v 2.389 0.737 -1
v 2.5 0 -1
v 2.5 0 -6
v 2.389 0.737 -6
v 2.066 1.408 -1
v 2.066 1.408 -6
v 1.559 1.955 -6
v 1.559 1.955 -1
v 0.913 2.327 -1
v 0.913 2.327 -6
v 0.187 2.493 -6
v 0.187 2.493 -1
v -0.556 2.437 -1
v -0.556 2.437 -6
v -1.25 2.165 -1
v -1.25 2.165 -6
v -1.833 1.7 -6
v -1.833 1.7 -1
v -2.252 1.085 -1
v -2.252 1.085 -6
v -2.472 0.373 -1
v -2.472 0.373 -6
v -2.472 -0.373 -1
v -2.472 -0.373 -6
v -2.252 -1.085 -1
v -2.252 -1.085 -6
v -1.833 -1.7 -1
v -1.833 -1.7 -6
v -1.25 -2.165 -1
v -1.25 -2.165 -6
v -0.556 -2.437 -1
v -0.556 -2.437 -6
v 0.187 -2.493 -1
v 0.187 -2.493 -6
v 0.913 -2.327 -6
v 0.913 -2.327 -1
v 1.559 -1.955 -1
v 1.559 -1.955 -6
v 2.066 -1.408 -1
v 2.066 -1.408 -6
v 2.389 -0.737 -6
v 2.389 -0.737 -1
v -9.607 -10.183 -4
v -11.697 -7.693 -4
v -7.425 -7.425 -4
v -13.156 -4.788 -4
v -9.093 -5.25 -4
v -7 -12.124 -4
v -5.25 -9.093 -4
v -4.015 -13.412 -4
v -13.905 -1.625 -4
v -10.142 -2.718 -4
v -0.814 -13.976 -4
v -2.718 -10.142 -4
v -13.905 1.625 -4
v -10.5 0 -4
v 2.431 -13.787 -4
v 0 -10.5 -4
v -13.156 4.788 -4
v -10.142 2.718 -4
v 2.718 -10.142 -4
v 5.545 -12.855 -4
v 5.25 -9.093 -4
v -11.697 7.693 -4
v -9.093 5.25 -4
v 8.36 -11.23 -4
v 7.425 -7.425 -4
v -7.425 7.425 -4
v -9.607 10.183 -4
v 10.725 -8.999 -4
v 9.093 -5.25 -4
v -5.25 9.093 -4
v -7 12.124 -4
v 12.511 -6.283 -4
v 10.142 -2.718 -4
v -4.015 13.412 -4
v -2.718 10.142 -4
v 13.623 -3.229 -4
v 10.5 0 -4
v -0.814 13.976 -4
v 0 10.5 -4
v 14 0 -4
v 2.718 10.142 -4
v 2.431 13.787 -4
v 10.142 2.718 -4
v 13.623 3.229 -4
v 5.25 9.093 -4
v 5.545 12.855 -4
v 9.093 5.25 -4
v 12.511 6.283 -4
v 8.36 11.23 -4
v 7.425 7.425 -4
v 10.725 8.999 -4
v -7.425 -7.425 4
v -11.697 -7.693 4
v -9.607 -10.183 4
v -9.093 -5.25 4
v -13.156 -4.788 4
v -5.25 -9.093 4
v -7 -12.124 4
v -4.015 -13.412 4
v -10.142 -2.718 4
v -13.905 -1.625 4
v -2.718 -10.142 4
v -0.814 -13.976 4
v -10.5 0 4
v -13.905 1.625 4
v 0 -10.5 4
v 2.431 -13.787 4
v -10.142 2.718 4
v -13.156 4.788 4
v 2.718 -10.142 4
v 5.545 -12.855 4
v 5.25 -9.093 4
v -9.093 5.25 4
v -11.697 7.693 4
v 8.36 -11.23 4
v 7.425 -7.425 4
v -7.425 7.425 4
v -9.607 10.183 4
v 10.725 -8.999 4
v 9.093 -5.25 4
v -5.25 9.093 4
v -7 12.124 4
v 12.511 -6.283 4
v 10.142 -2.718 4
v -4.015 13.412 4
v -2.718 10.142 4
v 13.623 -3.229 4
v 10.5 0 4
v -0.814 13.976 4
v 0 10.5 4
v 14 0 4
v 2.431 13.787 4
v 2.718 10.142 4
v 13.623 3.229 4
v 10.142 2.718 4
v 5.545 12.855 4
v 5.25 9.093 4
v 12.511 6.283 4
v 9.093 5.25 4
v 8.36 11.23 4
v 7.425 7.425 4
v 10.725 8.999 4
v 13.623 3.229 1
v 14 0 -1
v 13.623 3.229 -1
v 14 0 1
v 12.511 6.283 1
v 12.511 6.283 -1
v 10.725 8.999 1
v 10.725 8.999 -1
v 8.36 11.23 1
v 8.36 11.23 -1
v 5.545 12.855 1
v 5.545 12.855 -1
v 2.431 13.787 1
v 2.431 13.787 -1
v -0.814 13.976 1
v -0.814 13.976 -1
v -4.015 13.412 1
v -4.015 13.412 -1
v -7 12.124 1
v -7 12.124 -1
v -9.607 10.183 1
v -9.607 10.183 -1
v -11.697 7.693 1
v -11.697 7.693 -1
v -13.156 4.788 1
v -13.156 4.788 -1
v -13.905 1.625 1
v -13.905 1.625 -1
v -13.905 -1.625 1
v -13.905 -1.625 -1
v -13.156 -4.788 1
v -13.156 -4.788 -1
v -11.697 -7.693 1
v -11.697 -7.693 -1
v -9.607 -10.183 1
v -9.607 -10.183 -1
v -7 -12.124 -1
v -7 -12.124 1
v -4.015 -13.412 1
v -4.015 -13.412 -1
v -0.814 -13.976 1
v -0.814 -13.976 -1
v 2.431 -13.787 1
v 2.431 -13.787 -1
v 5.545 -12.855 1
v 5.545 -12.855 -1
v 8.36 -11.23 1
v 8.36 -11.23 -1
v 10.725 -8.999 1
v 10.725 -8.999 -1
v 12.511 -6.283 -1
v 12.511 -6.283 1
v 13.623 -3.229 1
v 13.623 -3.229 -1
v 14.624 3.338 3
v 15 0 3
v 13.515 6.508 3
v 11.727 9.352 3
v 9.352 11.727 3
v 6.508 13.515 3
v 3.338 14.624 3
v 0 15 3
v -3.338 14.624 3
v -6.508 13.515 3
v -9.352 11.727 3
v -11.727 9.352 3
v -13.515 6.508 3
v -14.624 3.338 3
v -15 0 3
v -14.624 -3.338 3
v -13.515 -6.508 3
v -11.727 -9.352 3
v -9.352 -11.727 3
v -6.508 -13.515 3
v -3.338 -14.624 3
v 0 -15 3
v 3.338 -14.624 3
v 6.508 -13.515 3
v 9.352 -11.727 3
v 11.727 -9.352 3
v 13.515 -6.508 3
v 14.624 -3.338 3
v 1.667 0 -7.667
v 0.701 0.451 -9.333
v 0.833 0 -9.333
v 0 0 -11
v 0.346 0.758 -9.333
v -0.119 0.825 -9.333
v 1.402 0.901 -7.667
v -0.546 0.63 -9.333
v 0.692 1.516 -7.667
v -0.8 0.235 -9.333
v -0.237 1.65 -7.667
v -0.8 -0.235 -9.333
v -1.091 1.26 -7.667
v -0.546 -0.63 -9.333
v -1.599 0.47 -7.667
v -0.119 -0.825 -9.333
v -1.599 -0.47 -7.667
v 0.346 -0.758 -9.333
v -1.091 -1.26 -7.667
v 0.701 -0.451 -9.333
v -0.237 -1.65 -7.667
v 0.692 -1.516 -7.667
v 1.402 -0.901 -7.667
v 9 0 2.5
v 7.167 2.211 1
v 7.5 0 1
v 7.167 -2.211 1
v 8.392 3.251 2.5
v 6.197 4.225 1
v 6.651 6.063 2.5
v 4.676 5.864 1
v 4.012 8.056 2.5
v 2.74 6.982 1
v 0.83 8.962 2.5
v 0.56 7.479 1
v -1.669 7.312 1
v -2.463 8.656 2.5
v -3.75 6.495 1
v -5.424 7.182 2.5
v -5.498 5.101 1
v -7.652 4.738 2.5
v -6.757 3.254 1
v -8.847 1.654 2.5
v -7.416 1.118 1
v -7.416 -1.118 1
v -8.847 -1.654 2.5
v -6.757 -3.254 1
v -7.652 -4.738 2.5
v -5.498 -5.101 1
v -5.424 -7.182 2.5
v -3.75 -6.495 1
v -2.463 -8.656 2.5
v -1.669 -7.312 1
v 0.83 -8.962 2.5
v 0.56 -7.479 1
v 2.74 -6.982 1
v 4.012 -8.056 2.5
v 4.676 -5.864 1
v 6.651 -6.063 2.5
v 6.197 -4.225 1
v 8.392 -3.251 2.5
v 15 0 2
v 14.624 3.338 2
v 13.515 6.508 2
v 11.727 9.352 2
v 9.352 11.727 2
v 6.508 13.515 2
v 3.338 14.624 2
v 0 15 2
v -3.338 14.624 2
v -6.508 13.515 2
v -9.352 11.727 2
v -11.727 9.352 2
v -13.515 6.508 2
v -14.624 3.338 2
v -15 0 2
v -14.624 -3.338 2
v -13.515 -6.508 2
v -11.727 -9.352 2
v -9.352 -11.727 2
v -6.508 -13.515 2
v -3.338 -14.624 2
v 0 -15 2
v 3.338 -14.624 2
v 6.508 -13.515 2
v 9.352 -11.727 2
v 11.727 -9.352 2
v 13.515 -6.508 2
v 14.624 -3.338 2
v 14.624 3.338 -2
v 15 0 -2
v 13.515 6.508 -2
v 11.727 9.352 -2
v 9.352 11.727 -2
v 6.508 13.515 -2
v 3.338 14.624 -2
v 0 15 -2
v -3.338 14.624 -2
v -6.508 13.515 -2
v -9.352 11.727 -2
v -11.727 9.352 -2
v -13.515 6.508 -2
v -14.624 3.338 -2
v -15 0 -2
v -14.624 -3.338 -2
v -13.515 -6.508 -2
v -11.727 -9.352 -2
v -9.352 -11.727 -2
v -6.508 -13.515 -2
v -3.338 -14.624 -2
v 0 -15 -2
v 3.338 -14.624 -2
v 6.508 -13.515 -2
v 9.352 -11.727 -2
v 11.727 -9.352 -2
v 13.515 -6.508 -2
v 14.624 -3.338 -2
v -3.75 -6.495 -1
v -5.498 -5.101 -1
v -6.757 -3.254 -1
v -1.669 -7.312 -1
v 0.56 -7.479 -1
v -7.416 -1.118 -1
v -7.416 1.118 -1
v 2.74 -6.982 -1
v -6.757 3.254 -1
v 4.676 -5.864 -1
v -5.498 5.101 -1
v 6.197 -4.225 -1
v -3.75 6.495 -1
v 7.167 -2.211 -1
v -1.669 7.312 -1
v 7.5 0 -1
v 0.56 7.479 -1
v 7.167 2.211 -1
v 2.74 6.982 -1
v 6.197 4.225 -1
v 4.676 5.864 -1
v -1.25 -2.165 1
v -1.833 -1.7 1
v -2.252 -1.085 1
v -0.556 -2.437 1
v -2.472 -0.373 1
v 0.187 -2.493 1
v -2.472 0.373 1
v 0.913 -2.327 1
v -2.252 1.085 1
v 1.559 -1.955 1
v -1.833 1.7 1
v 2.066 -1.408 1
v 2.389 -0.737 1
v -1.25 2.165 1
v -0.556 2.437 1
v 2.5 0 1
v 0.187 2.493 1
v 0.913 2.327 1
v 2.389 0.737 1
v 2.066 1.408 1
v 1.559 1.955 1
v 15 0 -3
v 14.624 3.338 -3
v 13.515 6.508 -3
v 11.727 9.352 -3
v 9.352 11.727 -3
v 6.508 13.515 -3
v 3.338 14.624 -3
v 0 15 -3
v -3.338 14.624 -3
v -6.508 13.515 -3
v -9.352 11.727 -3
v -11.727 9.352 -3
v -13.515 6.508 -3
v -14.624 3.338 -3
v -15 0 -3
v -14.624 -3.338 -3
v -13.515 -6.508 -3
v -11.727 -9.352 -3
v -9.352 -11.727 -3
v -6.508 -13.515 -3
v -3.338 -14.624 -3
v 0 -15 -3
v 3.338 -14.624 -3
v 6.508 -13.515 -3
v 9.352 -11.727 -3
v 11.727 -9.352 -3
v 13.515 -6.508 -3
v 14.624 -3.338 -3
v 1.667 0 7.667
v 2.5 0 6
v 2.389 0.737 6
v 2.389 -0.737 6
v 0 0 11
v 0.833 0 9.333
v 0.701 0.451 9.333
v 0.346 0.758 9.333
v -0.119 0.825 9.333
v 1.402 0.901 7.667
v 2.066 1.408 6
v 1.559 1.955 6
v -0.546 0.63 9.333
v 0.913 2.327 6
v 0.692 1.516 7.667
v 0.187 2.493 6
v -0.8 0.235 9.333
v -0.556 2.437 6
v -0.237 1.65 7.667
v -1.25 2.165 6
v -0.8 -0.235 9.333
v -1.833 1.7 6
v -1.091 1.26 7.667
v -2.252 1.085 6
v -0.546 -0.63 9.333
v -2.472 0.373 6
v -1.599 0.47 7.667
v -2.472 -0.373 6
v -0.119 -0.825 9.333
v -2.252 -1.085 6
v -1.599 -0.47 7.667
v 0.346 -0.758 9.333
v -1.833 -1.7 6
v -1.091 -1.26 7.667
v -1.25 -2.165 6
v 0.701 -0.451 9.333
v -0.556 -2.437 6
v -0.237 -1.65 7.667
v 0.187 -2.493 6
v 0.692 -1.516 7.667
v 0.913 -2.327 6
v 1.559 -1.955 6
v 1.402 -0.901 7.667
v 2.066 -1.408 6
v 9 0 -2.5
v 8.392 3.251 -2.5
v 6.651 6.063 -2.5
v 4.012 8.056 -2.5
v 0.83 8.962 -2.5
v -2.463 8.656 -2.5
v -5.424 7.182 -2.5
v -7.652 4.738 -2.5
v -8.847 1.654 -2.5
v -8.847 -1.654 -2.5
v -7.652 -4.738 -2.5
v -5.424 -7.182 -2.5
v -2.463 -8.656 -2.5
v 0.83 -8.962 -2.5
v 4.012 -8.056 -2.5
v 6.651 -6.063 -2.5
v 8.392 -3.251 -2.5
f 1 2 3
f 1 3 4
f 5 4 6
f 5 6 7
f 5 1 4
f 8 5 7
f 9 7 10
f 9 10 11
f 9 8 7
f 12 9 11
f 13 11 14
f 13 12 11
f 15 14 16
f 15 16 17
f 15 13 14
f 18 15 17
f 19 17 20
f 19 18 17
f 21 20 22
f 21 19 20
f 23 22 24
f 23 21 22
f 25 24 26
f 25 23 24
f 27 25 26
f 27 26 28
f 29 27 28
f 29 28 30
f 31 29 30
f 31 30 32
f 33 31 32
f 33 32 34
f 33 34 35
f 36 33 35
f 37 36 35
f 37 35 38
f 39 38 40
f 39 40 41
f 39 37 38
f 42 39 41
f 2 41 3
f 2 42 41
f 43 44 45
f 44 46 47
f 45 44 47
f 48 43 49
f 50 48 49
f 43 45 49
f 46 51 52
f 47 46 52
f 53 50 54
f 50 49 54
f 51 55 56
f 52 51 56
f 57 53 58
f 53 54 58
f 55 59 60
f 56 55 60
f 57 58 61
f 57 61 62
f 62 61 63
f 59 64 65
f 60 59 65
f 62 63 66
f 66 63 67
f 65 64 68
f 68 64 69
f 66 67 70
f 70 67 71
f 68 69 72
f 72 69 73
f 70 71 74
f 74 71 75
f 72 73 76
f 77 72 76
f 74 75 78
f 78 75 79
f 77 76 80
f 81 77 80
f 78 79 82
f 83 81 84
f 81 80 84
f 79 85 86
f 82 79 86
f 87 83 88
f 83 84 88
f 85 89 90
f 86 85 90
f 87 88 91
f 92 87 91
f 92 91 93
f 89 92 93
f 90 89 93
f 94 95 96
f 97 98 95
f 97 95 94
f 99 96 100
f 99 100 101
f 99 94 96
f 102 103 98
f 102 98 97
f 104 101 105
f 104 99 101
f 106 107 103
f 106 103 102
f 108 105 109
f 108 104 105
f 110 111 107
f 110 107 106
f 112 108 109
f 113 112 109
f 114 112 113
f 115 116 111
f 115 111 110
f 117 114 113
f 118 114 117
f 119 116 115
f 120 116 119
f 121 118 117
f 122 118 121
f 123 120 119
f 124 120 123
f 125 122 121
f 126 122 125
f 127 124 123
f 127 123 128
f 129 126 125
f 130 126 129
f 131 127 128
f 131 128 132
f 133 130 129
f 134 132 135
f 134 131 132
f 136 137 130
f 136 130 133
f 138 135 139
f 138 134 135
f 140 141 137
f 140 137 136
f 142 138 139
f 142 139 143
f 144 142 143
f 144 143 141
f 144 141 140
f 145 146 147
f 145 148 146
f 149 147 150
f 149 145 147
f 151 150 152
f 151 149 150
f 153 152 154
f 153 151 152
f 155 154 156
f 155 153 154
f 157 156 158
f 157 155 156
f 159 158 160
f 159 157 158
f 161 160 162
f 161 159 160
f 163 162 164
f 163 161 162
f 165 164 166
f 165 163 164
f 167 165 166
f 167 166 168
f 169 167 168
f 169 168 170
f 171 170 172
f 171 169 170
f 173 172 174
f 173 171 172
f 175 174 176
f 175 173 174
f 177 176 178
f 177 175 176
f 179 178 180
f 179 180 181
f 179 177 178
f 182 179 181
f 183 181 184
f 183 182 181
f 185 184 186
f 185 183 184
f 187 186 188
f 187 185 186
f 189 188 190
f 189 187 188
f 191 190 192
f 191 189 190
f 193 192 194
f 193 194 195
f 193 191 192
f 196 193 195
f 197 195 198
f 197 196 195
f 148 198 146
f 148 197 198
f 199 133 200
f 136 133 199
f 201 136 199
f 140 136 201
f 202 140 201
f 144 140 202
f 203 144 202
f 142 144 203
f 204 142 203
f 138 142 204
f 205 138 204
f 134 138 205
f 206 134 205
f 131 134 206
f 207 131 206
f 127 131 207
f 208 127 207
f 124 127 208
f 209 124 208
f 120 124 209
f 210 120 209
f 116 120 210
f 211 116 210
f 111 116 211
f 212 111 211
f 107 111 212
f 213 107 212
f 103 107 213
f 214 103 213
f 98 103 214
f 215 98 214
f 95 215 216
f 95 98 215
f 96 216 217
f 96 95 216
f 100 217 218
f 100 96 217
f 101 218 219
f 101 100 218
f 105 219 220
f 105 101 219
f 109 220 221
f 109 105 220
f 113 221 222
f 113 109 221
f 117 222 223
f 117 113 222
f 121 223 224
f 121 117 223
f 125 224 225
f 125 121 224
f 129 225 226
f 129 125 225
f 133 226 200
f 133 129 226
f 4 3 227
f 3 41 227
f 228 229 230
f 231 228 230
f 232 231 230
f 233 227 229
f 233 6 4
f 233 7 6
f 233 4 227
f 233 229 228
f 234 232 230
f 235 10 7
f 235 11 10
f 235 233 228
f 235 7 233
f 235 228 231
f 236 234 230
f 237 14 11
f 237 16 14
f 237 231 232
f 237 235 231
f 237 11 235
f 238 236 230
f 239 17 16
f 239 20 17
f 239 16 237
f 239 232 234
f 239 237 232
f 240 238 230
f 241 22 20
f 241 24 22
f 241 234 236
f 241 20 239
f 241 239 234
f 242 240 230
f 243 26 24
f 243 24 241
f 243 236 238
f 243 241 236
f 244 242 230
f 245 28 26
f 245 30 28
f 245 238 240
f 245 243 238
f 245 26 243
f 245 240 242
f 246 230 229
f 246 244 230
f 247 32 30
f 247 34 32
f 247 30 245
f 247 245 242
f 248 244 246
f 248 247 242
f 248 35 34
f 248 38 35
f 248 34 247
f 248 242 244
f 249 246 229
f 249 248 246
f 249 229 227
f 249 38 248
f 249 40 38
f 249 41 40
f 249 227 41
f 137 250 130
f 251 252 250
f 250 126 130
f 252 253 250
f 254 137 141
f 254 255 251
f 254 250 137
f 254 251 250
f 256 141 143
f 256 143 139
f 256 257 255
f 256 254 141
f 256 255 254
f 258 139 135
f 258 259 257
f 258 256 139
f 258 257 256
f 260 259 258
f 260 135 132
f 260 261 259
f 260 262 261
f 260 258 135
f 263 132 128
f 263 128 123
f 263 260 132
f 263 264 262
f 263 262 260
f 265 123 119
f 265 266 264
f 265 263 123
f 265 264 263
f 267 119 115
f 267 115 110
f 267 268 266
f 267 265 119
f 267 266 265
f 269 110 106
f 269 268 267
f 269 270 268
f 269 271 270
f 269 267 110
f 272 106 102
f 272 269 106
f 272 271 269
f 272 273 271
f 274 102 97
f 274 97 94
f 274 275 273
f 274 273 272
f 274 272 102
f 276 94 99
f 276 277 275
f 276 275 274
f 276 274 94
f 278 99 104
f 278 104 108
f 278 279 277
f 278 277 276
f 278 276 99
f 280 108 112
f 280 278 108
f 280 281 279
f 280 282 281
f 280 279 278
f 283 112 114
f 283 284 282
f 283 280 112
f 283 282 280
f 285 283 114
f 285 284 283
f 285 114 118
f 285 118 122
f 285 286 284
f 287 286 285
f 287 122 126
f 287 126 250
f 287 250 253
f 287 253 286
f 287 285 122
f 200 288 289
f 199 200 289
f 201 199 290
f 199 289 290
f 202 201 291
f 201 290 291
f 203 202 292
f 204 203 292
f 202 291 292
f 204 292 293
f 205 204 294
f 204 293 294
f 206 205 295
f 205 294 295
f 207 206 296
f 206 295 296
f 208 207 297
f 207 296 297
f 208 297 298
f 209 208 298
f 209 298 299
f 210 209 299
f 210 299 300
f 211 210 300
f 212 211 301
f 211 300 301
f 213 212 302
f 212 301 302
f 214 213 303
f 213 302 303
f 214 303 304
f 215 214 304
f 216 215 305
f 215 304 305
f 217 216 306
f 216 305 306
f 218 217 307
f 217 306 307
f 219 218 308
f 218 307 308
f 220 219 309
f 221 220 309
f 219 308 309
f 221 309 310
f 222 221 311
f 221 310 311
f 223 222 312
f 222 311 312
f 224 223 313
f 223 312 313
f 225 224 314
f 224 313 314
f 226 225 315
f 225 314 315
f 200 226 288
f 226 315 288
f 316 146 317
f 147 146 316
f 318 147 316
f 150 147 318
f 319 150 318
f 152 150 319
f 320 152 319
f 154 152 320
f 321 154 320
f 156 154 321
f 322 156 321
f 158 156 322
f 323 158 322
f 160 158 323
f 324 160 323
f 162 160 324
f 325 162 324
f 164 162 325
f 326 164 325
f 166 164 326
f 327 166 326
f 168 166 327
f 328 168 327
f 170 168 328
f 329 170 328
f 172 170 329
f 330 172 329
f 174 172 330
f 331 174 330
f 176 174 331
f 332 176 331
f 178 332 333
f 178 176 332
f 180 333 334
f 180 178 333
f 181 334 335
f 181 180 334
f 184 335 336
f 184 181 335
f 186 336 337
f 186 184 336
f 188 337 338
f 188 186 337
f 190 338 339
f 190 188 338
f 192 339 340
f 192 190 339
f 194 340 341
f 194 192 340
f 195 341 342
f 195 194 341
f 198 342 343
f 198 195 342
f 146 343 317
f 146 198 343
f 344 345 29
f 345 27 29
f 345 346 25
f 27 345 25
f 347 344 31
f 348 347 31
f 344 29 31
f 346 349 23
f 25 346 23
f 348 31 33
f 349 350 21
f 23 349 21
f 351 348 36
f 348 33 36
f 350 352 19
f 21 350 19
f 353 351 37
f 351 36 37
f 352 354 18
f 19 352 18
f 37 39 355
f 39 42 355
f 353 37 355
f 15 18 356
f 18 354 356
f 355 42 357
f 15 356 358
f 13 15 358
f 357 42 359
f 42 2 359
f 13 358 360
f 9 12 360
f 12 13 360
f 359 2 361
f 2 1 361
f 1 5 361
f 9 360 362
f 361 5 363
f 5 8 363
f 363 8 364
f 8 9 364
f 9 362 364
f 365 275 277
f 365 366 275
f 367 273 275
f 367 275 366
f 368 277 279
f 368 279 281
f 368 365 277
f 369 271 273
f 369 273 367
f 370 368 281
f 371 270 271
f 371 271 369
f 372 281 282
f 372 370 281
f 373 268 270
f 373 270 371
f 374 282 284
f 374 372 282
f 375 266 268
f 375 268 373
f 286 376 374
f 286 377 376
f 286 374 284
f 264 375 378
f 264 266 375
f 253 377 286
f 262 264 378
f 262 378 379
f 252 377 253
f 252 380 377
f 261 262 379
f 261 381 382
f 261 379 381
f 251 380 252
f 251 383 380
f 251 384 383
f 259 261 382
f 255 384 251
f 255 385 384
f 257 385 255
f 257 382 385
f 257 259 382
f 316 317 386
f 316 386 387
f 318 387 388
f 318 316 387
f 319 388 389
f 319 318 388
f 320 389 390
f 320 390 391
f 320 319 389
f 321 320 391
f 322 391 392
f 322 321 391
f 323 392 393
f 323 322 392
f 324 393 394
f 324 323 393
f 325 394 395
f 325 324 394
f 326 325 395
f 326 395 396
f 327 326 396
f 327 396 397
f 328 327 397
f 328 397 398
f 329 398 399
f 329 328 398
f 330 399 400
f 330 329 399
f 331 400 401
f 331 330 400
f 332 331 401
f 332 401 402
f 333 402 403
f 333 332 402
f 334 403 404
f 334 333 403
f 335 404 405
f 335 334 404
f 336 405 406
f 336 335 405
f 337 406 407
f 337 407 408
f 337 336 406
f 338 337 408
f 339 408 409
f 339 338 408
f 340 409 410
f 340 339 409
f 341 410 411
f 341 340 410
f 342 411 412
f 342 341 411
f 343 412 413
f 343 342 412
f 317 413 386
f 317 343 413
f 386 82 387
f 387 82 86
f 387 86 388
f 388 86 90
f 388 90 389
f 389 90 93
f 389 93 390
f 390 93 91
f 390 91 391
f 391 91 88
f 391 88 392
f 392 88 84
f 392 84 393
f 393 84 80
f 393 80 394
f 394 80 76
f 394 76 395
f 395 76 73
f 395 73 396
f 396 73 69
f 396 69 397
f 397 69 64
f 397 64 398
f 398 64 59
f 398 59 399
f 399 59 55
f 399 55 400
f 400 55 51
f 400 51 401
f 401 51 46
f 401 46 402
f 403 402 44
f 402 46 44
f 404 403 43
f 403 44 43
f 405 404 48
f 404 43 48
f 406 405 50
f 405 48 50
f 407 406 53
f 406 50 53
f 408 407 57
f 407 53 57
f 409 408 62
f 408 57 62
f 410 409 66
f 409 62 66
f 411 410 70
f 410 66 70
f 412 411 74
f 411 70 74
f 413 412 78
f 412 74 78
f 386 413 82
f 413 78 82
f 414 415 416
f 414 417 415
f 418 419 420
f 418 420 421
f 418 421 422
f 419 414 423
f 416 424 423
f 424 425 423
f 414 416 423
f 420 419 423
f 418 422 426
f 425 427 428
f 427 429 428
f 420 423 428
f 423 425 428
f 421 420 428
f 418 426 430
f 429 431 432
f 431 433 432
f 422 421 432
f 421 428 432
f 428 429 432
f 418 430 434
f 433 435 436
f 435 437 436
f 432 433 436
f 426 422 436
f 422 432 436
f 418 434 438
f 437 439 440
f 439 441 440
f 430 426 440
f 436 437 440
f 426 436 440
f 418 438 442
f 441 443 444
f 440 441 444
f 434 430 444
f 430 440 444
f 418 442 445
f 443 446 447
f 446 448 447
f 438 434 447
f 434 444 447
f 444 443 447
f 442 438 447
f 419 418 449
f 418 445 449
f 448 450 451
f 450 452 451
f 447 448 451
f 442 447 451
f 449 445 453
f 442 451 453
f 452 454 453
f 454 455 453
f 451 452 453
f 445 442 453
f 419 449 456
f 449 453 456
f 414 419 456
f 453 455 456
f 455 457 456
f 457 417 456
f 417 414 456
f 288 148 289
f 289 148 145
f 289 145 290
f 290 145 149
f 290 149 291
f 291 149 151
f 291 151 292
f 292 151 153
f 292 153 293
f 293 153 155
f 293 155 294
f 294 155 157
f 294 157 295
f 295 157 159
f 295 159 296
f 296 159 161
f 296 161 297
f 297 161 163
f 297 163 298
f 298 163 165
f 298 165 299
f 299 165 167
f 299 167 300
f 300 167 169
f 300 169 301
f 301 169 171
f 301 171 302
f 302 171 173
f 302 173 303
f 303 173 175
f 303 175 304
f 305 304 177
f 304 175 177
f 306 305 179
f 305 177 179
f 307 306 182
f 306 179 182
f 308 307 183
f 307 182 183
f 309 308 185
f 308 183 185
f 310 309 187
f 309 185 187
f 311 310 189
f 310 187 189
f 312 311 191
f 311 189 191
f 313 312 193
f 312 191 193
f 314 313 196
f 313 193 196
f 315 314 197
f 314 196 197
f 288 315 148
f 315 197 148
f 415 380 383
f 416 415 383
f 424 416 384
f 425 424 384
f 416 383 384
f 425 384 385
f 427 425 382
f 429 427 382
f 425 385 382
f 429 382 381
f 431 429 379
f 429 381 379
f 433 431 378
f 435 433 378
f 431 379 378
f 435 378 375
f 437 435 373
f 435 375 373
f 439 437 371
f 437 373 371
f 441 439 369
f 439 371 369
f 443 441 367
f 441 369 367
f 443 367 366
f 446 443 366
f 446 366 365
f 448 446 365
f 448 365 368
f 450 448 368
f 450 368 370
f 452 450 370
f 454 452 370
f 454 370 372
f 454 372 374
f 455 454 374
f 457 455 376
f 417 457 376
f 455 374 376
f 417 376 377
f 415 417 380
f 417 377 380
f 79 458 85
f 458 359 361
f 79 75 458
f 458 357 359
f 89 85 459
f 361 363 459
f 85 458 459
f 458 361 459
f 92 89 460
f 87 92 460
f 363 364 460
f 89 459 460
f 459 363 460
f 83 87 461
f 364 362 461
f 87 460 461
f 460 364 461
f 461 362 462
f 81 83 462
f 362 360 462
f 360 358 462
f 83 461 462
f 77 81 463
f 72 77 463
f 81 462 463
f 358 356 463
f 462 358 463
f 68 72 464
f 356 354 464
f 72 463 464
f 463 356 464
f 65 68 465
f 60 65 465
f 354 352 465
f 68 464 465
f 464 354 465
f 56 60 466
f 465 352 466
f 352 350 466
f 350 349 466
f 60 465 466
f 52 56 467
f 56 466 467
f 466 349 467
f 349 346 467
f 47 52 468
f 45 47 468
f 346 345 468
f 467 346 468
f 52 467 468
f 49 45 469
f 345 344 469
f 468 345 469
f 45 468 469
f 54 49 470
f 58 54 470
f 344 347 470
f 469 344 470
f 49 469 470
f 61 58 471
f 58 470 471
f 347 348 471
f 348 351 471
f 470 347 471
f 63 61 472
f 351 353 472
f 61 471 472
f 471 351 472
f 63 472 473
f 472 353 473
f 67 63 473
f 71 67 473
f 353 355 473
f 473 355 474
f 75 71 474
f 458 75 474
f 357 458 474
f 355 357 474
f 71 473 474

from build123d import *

# Parameters (mm, degrees)
F0_R     = 14
F1_DEPTH = 1
F2_R     = 15
F2_R_2   = 14
F2_R_3   = 7.5
F3_DEPTH = 3
F2_R_4   = 2.5
F4_DEPTH = 10
F5_SIZE  = 0.99999
F6_SIZE  = 2.99999
F7_SIZE2 = 5
F7_SIZE  = 2.5


# Not quite as in the source:
# - a fillet or chamfer is up to 0.001 mm smaller than in the source, because OpenCascade refuses the exact size


with BuildPart() as f1:
    # F0 (on Top) → F1 (new body)
    with BuildSketch(Plane.XY):
        Circle(F0_R)
    extrude(amount=F1_DEPTH)

    # F2 (on face) → F3 (join)
    with BuildSketch(Plane.XY.offset(1)):
        Circle(F2_R)
        Circle(F2_R_2, mode=Mode.SUBTRACT)
        Circle(F2_R_2)
        Circle(F2_R_3, mode=Mode.SUBTRACT)
    extrude(amount=F3_DEPTH)

    # F2 (on face) → F4 (join)
    with BuildSketch(Plane.XY.offset(1)):
        Circle(F2_R_4)
    extrude(amount=F4_DEPTH)

    # F5 (size 1 in the source; OpenCascade refuses exactly that, so slightly less here)
    f5_edges = [f1.edges().sort_by_distance(p)[0] for p in [
        (-15, 0, 4),
        (-15, 0, 1),
    ]]
    chamfer(f5_edges, length=F5_SIZE)

    # F6 (size 3 in the source; OpenCascade refuses exactly that, so slightly less here)
    f6_edges = [f1.edges().sort_by_distance(p)[0] for p in [
        (-7.5, 0, 4),
    ]]
    chamfer(f6_edges, length=F6_SIZE)

    # F7
    f7_edges = [f1.edges().sort_by_distance(p)[0] for p in [
        (-2.5, 0, 11),
    ]]
    f7_side = f1.faces().sort_by_distance((0, 0, 11))[0]
    chamfer(f7_edges, length=F7_SIZE, length2=F7_SIZE2, reference=f7_side)

    # F8: F1 across plane


with BuildPart() as f1_1:
    add(f1.part)
    add(f1.part.mirror(Plane.XY))


solid = f1_1.part
